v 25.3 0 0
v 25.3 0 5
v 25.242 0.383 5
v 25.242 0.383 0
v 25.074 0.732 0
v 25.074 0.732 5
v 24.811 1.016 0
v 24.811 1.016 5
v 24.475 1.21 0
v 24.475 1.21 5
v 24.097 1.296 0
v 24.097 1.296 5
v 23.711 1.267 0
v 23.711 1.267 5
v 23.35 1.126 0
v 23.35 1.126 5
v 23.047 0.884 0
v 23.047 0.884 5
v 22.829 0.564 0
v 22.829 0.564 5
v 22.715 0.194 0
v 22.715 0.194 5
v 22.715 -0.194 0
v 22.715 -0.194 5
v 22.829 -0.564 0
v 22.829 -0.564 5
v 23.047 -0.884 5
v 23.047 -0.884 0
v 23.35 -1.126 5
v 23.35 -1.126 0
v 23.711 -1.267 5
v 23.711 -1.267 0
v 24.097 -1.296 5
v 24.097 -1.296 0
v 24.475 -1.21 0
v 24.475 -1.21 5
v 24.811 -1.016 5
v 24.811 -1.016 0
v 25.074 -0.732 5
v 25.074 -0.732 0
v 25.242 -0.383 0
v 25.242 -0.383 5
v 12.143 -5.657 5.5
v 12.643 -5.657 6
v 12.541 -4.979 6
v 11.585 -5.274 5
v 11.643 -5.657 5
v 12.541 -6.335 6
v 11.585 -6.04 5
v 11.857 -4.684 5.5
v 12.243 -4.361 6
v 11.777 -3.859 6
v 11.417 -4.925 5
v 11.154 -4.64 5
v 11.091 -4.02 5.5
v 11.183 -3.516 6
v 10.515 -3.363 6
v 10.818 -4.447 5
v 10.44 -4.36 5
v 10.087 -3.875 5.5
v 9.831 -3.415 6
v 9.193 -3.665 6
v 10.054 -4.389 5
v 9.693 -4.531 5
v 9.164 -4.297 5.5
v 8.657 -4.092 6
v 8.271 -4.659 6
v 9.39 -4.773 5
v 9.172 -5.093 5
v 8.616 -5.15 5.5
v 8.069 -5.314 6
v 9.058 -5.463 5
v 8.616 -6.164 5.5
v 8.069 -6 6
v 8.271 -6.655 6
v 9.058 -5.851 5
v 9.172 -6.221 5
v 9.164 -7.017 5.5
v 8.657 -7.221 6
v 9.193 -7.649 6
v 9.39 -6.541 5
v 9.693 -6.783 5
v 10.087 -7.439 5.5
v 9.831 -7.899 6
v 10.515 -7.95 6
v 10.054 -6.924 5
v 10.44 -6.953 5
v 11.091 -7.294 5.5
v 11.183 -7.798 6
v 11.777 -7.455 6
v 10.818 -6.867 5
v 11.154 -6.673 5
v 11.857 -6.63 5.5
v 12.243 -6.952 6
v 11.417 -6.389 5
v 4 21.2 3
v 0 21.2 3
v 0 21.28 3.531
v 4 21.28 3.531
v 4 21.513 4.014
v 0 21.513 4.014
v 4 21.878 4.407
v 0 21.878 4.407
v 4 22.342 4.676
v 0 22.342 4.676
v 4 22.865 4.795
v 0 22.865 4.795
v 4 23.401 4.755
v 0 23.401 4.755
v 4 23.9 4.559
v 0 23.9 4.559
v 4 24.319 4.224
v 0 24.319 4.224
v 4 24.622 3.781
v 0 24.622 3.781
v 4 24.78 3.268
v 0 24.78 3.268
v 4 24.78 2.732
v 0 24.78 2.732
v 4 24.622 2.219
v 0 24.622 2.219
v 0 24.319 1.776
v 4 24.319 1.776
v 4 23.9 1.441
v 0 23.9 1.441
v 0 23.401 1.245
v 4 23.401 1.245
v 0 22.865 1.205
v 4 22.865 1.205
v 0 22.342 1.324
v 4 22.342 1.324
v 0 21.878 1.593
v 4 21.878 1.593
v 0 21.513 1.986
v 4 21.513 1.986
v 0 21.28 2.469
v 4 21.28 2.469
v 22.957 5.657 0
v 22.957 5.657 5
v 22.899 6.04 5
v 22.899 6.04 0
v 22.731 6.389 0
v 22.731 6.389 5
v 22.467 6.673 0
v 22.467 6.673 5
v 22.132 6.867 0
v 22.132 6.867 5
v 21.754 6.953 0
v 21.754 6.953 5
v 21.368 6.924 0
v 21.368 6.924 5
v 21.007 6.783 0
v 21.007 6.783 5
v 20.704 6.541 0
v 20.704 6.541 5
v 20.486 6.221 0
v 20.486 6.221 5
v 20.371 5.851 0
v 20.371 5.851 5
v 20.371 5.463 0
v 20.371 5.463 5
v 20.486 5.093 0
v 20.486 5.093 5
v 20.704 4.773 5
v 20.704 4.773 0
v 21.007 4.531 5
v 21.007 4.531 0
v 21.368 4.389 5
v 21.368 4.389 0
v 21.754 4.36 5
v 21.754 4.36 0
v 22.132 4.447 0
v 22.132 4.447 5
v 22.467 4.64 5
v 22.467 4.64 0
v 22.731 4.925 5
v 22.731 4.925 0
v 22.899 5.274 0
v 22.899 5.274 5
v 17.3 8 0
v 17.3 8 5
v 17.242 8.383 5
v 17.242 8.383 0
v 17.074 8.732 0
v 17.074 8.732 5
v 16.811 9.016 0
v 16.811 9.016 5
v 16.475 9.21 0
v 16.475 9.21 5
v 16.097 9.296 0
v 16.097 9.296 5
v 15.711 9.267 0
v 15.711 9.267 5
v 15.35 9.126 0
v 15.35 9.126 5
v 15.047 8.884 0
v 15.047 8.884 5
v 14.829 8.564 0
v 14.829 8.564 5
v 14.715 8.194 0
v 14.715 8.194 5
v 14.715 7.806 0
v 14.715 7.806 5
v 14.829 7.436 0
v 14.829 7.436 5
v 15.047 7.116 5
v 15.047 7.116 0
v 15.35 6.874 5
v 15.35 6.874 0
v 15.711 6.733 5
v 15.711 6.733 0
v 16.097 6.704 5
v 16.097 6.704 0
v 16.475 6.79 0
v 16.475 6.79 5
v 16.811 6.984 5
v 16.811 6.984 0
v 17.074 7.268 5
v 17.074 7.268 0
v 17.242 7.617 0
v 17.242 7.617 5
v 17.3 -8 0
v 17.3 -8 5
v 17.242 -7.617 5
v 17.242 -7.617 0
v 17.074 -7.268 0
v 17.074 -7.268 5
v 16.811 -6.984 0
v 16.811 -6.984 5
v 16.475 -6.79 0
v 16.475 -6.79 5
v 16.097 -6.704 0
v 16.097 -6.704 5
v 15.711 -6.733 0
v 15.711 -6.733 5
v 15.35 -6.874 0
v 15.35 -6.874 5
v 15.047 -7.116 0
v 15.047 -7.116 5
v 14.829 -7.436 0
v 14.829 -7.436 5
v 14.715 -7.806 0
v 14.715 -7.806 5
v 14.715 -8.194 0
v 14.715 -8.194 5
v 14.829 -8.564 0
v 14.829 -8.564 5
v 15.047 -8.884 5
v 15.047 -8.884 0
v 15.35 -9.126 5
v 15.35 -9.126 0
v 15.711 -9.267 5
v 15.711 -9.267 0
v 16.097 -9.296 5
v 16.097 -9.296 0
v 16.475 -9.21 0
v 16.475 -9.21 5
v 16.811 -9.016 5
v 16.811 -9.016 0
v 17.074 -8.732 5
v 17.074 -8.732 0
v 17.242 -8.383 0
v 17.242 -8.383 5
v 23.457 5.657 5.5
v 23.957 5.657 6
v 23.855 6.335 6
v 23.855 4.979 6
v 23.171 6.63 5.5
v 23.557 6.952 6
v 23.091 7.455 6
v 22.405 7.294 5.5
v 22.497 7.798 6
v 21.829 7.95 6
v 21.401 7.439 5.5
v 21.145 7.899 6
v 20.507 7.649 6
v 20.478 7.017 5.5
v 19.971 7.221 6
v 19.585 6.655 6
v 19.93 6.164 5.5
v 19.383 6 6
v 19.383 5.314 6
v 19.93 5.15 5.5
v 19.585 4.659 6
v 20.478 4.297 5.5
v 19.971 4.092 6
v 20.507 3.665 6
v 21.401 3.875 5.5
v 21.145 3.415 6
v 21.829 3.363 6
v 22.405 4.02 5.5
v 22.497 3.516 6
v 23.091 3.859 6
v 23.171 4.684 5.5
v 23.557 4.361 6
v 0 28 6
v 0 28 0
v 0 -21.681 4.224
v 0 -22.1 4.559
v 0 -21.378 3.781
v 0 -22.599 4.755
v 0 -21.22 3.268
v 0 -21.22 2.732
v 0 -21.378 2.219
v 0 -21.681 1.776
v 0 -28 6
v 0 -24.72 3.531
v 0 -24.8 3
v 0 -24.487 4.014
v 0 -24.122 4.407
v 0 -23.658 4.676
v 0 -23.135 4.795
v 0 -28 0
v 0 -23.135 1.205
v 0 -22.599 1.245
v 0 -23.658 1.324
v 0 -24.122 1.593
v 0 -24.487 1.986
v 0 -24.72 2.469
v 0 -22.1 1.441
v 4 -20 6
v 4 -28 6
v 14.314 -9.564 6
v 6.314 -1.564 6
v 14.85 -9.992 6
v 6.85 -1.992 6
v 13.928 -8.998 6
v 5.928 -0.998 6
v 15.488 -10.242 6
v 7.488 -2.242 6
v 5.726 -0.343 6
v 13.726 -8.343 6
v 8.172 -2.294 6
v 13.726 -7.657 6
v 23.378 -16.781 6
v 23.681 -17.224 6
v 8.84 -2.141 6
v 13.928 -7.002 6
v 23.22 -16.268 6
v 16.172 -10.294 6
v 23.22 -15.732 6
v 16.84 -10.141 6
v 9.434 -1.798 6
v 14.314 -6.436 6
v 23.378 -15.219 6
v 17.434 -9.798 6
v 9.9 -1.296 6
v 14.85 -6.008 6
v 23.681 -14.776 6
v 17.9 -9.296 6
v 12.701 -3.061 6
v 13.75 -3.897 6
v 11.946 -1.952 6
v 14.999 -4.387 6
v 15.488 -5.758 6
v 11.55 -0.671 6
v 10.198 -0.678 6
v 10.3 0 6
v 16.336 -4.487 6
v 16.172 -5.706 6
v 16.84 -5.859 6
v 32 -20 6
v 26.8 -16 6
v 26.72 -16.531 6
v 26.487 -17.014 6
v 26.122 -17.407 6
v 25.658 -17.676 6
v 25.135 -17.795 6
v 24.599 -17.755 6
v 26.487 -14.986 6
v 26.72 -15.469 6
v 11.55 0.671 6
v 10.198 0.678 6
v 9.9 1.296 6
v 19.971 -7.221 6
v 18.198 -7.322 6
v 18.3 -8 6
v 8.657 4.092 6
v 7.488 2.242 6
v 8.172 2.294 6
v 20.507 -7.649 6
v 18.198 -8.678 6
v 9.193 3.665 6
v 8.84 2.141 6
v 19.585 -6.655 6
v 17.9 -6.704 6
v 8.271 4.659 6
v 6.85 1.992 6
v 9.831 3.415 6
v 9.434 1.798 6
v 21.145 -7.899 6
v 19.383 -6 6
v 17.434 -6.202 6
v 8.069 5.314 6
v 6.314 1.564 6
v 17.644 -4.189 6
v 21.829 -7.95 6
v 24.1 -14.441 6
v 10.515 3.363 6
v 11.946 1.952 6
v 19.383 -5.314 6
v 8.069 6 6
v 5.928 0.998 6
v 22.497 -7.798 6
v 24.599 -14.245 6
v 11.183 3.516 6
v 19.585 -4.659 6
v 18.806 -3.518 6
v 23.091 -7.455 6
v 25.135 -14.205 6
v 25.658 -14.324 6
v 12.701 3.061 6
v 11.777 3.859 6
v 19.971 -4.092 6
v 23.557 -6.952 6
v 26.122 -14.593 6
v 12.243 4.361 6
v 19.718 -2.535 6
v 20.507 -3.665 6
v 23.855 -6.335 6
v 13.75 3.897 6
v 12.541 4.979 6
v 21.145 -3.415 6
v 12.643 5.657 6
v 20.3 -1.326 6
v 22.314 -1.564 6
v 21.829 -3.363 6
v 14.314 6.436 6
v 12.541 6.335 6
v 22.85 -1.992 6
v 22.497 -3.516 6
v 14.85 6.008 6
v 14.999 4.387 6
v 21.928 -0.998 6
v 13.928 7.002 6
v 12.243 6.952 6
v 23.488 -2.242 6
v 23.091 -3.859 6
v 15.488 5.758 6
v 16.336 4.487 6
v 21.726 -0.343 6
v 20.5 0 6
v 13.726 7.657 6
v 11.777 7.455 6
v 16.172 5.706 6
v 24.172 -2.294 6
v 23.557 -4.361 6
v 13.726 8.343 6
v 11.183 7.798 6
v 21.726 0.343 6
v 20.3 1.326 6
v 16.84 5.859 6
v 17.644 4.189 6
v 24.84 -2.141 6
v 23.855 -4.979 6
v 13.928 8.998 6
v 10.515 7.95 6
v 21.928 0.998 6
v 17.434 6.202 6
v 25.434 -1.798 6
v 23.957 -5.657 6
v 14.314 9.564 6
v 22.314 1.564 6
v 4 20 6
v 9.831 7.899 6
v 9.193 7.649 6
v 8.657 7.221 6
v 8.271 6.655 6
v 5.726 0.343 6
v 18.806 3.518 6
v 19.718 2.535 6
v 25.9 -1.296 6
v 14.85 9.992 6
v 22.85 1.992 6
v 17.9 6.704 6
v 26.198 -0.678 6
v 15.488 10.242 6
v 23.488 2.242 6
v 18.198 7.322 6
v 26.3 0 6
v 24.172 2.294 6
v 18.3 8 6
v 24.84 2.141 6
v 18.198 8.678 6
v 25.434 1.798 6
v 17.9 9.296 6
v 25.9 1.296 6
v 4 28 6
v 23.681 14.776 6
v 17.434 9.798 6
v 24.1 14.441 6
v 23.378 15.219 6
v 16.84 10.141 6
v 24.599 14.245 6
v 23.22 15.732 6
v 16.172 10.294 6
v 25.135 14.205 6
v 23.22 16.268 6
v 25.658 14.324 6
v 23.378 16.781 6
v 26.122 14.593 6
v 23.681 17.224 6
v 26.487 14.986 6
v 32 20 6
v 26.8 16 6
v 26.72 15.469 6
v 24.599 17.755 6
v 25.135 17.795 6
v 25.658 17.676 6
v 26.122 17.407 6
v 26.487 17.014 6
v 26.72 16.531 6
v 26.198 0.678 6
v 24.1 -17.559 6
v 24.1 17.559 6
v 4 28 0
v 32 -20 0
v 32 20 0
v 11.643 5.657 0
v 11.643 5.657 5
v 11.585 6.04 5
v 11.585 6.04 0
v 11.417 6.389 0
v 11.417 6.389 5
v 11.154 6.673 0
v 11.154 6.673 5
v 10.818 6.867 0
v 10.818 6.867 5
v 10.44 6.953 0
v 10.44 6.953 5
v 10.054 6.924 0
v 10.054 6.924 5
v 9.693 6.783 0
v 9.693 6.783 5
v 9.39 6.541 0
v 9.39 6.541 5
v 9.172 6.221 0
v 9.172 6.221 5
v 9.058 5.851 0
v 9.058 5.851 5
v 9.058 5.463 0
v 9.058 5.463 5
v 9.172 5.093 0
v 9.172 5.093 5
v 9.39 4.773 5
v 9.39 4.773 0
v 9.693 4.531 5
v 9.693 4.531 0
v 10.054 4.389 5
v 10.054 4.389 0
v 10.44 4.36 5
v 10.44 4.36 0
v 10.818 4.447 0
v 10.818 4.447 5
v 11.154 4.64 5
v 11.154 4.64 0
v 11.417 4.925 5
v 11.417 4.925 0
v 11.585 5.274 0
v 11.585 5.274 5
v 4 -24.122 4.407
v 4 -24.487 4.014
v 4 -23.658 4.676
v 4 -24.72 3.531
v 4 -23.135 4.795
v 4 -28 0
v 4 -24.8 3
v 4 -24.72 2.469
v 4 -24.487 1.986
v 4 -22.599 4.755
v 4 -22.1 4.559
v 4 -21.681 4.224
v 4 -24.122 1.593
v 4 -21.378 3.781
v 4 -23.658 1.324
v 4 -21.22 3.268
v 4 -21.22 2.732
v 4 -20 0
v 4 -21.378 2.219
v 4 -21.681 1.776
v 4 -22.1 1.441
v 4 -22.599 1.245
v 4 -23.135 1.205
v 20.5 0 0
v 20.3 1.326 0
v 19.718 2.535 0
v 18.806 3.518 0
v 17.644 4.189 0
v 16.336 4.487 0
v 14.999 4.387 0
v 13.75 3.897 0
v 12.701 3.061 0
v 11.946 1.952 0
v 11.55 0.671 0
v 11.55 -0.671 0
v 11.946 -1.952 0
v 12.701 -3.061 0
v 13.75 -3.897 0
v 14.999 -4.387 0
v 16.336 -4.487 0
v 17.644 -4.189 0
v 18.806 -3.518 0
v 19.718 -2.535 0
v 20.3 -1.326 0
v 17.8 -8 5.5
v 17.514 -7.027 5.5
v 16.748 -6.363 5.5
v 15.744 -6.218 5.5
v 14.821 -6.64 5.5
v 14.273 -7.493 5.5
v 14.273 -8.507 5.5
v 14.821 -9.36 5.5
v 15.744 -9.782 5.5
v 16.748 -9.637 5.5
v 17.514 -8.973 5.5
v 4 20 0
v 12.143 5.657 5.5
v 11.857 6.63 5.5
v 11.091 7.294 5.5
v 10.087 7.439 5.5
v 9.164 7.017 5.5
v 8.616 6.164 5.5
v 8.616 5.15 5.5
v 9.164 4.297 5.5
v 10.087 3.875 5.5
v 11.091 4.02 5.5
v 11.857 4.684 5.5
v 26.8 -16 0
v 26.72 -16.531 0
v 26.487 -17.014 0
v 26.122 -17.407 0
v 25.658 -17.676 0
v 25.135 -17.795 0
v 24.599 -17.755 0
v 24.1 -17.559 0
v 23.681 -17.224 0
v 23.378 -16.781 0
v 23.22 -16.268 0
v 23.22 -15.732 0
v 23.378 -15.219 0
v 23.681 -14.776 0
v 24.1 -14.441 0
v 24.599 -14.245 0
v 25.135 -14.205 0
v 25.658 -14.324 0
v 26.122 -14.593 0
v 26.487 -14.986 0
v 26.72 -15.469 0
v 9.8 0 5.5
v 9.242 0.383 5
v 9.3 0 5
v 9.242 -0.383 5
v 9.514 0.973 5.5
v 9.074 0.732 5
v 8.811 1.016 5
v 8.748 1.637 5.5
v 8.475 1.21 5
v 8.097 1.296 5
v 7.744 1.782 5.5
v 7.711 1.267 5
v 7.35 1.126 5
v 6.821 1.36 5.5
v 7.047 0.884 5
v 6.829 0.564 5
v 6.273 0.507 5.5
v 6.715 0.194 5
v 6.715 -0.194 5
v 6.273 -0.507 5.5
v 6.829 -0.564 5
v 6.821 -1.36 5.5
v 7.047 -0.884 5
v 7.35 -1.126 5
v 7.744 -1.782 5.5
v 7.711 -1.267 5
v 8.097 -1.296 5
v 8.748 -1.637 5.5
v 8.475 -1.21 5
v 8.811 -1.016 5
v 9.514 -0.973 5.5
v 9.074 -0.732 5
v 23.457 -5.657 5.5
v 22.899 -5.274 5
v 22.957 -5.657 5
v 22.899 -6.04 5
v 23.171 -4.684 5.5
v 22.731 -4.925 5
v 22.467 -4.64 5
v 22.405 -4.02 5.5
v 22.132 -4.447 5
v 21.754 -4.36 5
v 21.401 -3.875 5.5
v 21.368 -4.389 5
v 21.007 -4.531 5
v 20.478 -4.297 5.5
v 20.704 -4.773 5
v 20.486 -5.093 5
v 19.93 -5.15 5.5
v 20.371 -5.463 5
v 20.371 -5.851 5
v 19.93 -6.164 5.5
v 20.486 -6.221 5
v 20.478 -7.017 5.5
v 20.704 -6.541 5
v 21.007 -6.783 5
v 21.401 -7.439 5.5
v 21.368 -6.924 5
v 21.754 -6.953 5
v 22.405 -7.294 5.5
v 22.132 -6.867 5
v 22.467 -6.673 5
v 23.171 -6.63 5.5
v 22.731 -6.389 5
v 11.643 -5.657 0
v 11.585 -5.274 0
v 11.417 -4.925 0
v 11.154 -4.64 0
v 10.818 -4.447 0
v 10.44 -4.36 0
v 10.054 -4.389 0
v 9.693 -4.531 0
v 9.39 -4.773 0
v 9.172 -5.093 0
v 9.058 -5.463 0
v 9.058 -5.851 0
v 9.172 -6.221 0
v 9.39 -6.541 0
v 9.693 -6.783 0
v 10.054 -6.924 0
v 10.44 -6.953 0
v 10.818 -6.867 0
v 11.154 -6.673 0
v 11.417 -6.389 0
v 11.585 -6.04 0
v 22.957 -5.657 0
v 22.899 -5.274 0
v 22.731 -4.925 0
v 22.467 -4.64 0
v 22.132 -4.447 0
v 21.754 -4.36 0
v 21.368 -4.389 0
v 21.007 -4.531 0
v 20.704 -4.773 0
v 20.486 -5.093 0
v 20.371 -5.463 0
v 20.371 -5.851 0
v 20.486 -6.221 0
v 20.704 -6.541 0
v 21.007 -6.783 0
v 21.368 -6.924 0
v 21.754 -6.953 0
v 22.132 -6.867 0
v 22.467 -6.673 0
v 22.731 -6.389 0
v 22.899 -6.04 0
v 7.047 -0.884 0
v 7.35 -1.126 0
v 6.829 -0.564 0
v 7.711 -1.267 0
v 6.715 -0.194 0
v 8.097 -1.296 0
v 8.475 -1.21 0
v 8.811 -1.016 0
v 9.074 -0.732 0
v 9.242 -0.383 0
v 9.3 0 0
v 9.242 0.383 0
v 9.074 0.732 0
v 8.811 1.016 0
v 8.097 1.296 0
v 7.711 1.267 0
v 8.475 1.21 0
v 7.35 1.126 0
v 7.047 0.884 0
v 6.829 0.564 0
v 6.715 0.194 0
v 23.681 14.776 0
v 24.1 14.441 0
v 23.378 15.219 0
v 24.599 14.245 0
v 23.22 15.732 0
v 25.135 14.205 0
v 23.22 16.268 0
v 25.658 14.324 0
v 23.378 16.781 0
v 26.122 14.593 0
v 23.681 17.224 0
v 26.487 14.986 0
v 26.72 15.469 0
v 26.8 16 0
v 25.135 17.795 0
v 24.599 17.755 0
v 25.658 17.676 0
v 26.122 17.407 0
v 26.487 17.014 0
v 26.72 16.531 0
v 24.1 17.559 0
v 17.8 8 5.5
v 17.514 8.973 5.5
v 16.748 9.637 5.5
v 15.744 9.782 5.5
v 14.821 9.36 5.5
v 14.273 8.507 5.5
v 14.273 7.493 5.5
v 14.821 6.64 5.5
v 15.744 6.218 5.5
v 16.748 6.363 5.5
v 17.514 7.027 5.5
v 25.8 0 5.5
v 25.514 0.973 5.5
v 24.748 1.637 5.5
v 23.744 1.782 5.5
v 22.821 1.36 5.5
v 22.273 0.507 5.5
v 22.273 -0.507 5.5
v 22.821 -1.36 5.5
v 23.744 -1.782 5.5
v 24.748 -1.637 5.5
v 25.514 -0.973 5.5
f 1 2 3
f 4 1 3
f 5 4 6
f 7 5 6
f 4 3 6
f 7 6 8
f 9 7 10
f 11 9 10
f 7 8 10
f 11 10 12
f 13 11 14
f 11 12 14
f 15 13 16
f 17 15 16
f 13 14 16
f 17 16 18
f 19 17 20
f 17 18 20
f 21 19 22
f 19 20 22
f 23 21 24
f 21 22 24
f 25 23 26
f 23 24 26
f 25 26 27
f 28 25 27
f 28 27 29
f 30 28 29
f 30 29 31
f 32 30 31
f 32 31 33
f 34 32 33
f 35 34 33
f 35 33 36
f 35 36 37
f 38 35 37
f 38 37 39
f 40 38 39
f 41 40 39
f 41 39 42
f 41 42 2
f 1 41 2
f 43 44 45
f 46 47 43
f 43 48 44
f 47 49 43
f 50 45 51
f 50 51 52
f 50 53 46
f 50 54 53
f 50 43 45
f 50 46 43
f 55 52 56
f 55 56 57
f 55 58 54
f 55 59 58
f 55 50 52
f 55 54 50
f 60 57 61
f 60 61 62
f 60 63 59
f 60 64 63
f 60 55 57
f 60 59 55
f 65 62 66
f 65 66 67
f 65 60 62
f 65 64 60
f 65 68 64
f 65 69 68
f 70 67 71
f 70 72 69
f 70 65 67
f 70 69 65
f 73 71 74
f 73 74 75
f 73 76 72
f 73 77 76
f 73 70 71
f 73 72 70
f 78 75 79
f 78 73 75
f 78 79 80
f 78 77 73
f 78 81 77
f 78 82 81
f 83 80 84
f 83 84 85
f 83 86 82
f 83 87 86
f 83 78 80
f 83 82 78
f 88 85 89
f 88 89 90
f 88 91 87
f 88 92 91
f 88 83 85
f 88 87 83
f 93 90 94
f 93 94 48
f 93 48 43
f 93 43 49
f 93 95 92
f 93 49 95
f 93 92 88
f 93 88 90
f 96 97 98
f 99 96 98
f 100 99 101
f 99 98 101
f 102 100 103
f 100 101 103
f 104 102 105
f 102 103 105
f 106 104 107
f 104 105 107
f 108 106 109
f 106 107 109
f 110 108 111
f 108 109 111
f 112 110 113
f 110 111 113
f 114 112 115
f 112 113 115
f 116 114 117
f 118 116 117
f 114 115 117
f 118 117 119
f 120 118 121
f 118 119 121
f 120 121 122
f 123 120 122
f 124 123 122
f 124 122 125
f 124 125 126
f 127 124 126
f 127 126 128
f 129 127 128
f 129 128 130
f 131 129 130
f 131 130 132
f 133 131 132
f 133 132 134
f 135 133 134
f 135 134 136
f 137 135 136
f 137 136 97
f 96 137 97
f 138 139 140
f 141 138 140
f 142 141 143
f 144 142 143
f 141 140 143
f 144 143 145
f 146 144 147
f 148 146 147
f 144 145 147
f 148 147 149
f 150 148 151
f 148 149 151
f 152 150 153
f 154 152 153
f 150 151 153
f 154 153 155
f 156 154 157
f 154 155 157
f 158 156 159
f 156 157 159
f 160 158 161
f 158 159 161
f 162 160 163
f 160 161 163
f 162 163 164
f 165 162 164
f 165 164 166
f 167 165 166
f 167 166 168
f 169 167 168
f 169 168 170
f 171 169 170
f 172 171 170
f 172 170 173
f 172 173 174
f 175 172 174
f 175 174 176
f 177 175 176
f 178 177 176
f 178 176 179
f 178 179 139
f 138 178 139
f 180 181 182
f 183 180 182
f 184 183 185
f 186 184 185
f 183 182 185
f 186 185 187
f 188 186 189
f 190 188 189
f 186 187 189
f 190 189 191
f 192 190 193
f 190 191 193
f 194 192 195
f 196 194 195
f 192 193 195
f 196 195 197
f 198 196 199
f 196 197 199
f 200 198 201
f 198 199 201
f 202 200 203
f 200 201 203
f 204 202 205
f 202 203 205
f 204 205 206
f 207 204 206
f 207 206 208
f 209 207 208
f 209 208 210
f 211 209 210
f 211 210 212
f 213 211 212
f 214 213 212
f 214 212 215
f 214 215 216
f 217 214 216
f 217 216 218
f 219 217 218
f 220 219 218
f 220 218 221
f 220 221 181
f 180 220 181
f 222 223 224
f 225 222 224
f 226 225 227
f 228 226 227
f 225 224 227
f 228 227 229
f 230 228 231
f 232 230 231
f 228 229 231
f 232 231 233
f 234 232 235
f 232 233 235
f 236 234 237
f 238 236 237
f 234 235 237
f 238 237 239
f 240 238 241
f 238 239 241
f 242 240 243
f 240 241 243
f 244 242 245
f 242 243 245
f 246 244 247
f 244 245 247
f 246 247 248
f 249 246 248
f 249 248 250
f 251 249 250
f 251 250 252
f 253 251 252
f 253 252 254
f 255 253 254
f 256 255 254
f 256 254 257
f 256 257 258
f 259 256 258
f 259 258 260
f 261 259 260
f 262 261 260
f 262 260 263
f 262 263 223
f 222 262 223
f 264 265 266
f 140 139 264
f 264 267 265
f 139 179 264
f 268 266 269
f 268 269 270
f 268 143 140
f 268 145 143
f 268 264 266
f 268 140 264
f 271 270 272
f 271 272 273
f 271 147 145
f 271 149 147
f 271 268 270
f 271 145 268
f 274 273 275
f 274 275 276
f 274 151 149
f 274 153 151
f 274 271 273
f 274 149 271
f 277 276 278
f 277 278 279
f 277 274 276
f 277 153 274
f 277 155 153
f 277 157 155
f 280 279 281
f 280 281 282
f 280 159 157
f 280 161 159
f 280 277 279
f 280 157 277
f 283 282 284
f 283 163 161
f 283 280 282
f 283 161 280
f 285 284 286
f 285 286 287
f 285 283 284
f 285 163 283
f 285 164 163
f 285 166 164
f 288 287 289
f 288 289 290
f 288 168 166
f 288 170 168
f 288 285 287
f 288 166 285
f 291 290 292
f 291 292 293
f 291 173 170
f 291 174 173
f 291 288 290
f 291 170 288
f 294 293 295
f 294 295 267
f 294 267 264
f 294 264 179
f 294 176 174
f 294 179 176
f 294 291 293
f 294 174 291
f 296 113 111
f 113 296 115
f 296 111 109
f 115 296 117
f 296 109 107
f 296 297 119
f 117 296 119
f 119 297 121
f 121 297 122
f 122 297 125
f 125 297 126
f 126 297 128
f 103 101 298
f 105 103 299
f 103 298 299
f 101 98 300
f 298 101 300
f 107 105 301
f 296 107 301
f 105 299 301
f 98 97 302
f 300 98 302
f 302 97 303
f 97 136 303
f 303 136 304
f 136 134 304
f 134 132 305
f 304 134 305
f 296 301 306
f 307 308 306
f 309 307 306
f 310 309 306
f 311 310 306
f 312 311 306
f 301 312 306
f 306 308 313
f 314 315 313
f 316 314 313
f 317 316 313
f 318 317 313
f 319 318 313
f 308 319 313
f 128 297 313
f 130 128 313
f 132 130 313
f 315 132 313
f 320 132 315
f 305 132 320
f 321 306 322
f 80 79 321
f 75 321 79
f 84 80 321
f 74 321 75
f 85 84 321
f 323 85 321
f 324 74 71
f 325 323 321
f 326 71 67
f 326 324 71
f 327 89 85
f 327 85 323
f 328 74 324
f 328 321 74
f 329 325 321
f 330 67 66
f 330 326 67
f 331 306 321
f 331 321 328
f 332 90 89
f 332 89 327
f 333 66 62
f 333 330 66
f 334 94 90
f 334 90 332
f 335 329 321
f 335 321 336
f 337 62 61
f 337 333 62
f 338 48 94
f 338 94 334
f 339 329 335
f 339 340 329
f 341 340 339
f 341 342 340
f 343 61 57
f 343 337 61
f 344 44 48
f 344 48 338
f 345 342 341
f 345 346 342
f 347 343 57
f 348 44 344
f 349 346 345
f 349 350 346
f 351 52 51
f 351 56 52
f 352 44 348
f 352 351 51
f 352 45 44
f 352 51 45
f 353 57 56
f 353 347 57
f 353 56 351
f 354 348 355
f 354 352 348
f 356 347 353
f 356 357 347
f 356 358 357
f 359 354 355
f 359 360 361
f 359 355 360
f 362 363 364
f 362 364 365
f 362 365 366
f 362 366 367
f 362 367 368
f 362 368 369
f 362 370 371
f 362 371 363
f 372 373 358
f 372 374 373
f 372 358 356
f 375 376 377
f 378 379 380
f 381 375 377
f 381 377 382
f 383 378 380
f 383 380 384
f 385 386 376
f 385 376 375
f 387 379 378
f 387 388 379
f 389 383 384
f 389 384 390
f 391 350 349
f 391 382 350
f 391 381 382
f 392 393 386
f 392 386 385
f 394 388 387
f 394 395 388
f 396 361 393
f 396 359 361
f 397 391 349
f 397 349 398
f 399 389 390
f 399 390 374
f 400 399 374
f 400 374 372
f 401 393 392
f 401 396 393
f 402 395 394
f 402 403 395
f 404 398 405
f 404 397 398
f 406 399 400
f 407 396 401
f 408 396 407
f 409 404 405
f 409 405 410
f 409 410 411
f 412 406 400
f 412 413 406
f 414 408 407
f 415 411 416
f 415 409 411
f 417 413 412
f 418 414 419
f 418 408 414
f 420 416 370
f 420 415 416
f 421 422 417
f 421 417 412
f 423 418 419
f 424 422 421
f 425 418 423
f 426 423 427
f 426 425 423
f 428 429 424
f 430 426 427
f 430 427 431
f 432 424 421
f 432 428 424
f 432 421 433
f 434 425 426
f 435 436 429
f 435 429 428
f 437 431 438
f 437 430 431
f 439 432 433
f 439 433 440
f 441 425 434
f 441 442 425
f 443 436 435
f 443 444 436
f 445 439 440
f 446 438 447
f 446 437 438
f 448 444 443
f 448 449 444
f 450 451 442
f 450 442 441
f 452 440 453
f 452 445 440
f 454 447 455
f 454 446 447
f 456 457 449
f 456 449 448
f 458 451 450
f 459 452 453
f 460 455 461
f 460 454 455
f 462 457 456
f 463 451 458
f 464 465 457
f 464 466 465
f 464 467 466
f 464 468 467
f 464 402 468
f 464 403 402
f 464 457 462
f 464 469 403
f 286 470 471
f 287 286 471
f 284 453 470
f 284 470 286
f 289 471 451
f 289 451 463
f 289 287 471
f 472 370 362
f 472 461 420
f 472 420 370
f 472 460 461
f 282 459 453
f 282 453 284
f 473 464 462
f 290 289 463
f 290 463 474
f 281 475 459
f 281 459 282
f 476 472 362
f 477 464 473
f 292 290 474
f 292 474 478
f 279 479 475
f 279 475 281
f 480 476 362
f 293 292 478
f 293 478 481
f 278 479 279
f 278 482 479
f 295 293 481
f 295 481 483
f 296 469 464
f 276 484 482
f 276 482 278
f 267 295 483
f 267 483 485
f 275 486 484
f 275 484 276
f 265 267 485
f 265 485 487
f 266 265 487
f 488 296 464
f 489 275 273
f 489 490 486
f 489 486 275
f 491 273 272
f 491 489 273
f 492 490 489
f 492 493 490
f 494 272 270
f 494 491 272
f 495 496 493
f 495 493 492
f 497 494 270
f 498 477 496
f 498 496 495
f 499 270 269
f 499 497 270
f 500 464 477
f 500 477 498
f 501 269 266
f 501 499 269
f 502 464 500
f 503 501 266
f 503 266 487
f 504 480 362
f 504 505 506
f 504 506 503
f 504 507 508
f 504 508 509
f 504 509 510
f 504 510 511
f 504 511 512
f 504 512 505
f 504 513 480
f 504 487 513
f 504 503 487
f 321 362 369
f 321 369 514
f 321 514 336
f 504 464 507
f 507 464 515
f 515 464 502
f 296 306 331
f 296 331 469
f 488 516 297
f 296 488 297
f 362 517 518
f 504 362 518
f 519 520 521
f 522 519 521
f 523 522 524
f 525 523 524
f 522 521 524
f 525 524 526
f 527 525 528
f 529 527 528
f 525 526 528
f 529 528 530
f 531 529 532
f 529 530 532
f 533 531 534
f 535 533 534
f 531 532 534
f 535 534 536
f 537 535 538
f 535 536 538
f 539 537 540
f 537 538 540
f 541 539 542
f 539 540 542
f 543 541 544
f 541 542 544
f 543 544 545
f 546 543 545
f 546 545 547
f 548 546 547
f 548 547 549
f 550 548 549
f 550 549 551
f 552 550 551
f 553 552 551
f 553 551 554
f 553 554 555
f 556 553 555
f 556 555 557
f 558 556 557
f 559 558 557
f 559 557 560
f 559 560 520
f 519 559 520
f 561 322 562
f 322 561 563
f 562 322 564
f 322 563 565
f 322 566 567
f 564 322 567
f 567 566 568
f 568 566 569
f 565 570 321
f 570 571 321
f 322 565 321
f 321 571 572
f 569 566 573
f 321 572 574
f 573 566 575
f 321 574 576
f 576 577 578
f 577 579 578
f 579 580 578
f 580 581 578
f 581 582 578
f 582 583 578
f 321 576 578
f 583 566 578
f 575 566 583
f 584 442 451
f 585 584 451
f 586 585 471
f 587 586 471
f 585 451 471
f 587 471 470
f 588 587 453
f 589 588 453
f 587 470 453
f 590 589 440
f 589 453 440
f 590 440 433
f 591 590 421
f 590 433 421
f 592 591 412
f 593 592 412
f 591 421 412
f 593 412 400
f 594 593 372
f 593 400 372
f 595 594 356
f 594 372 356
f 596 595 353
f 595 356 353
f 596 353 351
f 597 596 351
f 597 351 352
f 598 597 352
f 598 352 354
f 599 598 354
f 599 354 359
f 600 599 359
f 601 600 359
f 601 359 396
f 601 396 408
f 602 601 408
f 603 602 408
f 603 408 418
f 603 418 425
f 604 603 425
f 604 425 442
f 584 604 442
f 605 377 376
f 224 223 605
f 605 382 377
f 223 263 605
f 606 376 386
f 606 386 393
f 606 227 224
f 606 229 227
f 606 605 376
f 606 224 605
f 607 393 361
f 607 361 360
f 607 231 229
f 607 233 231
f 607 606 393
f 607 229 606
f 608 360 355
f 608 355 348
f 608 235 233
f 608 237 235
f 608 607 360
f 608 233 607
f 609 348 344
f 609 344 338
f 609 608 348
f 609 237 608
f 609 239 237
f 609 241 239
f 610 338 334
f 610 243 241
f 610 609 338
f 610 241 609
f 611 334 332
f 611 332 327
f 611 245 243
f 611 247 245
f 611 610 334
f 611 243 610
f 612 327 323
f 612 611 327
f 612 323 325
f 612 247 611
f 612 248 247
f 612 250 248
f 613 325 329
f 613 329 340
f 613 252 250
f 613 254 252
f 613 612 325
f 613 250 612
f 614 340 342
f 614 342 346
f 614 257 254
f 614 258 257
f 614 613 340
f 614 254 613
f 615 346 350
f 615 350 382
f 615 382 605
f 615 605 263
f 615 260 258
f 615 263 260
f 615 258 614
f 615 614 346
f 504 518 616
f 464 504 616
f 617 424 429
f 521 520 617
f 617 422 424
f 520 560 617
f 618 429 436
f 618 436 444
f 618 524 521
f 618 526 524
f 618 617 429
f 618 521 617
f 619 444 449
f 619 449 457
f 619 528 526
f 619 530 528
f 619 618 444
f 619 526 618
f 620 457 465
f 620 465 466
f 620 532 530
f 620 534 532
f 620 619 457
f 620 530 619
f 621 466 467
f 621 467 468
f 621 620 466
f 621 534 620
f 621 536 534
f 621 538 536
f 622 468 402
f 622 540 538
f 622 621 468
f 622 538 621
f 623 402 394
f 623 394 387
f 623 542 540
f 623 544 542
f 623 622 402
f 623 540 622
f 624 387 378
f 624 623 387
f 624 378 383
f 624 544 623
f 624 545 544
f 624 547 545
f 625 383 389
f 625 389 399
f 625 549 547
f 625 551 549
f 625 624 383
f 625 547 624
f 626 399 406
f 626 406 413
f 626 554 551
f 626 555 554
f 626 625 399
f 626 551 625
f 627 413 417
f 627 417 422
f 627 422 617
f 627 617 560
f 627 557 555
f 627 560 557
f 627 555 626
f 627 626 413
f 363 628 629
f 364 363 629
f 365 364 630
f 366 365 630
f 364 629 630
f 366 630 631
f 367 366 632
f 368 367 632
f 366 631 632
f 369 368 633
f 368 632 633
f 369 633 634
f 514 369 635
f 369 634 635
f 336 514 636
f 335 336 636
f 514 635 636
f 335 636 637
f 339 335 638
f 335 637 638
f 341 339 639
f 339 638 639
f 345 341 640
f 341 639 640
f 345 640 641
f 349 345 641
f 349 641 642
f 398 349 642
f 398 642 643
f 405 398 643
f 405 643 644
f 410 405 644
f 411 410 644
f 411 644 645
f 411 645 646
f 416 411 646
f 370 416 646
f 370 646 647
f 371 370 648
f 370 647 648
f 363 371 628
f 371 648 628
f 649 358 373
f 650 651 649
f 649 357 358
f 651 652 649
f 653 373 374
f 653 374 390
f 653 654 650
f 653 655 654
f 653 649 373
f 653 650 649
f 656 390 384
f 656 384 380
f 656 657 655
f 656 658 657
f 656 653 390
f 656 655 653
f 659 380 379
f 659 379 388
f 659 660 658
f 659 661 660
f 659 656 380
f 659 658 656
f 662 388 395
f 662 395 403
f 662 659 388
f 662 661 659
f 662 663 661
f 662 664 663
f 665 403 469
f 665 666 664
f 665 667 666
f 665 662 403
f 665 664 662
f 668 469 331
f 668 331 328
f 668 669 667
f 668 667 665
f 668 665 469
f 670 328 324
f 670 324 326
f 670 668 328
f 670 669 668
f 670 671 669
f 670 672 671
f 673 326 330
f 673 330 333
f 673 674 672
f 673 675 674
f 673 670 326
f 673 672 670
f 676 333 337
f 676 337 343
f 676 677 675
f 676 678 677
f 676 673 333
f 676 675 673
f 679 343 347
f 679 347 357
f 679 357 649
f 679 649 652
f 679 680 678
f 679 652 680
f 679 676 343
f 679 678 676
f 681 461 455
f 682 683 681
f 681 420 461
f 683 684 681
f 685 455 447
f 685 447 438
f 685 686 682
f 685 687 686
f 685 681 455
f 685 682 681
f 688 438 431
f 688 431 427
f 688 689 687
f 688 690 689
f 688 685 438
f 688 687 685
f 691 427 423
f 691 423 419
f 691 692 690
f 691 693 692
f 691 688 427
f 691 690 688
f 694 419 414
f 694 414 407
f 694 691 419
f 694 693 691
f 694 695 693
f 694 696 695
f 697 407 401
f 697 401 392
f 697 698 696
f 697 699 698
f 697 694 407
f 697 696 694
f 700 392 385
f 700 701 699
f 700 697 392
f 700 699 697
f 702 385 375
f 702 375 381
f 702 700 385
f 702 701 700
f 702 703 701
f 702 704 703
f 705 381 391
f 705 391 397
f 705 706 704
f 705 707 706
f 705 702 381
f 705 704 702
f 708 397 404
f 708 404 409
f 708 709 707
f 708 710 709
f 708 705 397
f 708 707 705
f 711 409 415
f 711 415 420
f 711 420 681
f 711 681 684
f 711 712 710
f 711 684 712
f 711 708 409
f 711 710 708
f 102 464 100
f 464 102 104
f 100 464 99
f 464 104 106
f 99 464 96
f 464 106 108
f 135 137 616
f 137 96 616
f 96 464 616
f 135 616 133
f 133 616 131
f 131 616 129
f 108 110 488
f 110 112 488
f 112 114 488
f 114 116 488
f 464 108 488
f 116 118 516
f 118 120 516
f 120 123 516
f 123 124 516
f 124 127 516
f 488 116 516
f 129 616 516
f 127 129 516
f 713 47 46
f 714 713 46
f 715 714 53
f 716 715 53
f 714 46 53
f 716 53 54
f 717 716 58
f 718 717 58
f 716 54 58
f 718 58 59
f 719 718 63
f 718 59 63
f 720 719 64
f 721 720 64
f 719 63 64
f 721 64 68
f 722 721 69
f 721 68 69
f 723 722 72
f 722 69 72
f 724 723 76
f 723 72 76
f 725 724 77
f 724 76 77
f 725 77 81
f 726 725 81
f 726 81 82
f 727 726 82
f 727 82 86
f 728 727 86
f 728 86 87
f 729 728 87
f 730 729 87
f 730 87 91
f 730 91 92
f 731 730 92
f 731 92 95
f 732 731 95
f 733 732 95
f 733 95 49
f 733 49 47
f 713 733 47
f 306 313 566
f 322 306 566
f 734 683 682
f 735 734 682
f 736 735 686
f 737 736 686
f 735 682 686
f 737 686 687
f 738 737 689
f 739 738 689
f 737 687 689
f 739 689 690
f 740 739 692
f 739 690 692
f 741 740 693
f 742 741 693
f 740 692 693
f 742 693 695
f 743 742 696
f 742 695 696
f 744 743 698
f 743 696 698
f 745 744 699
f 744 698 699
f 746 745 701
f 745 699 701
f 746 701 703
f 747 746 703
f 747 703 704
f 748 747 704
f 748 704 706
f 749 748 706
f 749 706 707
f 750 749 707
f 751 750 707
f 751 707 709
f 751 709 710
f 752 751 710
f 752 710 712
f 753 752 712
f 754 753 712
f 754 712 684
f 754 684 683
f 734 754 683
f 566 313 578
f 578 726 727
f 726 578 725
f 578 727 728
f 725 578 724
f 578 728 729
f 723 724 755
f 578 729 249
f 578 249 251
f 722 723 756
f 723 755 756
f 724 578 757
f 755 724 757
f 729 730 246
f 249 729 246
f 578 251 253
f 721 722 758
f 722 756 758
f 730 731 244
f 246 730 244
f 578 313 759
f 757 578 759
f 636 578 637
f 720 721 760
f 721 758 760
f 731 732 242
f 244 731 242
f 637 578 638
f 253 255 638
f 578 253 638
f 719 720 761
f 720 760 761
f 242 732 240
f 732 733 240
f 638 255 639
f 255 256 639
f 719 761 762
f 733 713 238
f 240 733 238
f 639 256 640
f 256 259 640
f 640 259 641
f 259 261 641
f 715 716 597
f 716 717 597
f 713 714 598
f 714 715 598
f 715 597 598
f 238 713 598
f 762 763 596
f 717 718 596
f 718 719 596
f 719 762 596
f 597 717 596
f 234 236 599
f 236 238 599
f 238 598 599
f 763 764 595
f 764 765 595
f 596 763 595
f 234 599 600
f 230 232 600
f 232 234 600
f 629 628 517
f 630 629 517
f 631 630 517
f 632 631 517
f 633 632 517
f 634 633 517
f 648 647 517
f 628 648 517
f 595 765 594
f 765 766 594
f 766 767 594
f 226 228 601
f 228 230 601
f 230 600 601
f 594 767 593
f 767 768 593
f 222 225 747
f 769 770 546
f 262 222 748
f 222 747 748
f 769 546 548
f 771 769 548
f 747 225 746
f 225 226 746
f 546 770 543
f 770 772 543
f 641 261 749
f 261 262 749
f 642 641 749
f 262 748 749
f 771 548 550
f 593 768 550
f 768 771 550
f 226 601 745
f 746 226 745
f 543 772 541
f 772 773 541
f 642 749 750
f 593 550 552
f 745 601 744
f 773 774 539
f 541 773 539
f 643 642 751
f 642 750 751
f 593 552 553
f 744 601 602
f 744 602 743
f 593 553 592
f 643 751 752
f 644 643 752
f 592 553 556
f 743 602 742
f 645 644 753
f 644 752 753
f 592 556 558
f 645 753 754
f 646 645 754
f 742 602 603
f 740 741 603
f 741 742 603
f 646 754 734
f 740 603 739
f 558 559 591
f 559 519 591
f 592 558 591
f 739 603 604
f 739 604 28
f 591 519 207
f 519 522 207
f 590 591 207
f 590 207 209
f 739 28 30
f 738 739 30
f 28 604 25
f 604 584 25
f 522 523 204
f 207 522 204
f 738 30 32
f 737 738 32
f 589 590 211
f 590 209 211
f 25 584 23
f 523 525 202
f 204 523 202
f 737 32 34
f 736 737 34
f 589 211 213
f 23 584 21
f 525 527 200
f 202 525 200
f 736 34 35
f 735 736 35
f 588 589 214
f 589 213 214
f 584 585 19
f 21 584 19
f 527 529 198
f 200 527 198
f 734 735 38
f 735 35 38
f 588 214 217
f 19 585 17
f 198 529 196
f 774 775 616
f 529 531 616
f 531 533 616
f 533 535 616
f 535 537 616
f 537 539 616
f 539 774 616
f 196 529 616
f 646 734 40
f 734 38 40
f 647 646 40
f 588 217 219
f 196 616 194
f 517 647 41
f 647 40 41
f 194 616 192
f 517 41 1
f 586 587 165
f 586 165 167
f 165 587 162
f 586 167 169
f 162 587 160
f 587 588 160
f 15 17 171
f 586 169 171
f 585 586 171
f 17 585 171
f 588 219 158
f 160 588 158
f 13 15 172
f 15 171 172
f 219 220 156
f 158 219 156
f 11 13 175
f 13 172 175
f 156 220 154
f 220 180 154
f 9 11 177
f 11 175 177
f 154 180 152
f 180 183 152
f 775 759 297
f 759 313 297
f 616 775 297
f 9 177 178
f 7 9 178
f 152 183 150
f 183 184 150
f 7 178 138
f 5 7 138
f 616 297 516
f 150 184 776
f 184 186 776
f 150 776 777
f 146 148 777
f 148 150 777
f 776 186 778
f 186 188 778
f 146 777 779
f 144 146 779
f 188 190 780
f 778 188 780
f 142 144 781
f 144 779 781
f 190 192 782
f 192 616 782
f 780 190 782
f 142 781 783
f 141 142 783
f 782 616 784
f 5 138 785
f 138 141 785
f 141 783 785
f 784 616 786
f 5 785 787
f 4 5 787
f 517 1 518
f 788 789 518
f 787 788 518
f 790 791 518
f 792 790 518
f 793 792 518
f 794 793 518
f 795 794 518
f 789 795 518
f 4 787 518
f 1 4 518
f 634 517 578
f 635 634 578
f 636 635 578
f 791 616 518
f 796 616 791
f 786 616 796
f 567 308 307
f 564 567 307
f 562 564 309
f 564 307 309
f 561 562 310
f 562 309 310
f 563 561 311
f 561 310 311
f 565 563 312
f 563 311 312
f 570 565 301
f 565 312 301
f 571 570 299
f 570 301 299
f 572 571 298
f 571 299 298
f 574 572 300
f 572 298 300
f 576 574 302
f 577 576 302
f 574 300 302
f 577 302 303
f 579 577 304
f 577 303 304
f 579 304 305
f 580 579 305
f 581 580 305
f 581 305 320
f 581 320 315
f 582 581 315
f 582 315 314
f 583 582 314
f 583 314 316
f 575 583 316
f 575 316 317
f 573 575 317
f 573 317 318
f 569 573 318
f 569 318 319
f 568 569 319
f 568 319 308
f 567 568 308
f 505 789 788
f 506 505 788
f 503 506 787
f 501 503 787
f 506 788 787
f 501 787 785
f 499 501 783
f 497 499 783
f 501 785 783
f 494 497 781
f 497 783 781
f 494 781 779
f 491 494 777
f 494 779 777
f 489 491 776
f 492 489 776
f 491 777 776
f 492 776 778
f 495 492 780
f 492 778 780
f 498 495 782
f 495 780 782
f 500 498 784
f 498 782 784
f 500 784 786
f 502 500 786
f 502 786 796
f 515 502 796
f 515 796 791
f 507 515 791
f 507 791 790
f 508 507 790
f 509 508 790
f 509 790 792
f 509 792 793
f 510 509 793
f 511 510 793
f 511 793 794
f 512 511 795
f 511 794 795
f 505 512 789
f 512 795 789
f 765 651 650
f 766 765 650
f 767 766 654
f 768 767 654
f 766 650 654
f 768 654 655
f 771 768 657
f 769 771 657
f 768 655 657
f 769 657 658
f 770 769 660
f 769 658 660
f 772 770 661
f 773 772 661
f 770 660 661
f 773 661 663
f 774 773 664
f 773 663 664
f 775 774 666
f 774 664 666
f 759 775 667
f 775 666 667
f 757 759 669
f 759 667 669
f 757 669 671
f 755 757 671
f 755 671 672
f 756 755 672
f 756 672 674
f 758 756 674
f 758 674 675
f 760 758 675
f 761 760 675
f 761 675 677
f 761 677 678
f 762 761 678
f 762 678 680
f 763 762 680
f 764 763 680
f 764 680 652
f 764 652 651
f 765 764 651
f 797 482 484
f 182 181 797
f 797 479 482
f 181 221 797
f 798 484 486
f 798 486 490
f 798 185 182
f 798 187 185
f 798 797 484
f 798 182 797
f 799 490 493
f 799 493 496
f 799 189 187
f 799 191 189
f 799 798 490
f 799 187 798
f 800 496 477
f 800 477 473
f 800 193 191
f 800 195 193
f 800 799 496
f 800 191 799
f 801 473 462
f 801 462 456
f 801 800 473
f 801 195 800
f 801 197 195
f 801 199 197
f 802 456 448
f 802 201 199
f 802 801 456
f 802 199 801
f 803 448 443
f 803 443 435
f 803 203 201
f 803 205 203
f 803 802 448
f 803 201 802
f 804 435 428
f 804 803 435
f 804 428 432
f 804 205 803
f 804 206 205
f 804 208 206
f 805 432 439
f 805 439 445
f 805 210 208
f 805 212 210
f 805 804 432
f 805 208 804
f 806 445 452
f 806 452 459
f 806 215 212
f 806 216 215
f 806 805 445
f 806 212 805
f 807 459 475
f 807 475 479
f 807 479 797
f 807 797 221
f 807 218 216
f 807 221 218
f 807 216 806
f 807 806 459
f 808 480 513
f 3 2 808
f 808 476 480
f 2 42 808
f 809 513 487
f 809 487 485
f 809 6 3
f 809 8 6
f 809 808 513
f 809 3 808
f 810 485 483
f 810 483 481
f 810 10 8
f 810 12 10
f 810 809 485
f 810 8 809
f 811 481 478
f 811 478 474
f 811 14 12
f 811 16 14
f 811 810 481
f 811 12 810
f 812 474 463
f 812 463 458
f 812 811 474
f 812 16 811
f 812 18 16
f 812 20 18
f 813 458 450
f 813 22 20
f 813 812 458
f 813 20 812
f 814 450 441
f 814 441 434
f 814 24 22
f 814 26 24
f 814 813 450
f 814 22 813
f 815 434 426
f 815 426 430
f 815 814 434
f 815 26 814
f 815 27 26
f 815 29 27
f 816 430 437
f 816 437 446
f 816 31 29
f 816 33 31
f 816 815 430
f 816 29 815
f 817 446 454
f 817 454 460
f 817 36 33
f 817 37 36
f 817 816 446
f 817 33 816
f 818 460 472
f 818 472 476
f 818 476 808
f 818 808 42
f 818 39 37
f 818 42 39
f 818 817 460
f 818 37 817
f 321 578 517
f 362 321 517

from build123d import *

# Parameters (mm, degrees)
PAD_DEPTH       = 6
SKETCH002_R     = 4.5
SKETCH002_R_2   = 1.3
POCKET001_DEPTH = 20
SKETCH005_R     = 1.8
POCKET_DEPTH    = 5
SKETCH006_R     = 1.8
POCKET002_DEPTH = 6
CHAMFER_SIZE    = 1


with BuildPart() as part:
    # Sketch → Pad (new body)
    with BuildSketch(Plane.XY):
        Polygon((0, 20), (0, -20), (0, -28), (4, -28), (4, -20), (32, -20), (32, 20), (4, 20), (4, 28), (0, 28), align=None)
    extrude(amount=PAD_DEPTH)

    # Sketch002 → Pocket001 (cut)
    with BuildSketch(Plane.XY.offset(6)):
        with Locations((16, 0)):
            Circle(SKETCH002_R)
        with Locations((16, 8)):
            Circle(SKETCH002_R_2)
        with Locations((21.656854, 5.656854)):
            Circle(SKETCH002_R_2)
        with Locations((24, 0)):
            Circle(SKETCH002_R_2)
        with Locations((21.656854, -5.656854)):
            Circle(SKETCH002_R_2)
        with Locations((16, -8)):
            Circle(SKETCH002_R_2)
        with Locations((10.343146, -5.656854)):
            Circle(SKETCH002_R_2)
        with Locations((8, 0)):
            Circle(SKETCH002_R_2)
        with Locations((10.343146, 5.656854)):
            Circle(SKETCH002_R_2)
    extrude(amount=-POCKET001_DEPTH, mode=Mode.SUBTRACT)

    # Sketch005 → Pocket (cut)
    with BuildSketch(Plane(origin=(0, 0, 0), x_dir=(0, -1, 0), z_dir=(-1, 0, 0))):
        with Locations((23, 3)):
            Circle(SKETCH005_R)
        with Locations((-23, 3)):
            Circle(SKETCH005_R)
    extrude(amount=-POCKET_DEPTH, mode=Mode.SUBTRACT)

    # Sketch006 (on Face4 of Pocket) → Pocket002 (cut)
    with BuildSketch(Plane(origin=(0, 0, 0), x_dir=(1, 0, 0), z_dir=(0, 0, -1))):
        with Locations((25, 16)):
            Circle(SKETCH006_R)
        with Locations((25, -16)):
            Circle(SKETCH006_R)
    extrude(amount=-POCKET002_DEPTH, mode=Mode.SUBTRACT)

    # Chamfer
    chamfer_edges = [part.edges().sort_by_distance(p)[0] for p in [
        (20.356854, -5.656854, 6),
        (22.7, 0, 6),
        (20.356854, 5.656854, 6),
        (14.7, 8, 6),
        (9.043146, 5.656854, 6),
        (6.7, 0, 6),
        (9.043146, -5.656854, 6),
        (14.7, -8, 6),
    ]]
    chamfer(chamfer_edges, length=CHAMFER_SIZE)


solid = part.part
